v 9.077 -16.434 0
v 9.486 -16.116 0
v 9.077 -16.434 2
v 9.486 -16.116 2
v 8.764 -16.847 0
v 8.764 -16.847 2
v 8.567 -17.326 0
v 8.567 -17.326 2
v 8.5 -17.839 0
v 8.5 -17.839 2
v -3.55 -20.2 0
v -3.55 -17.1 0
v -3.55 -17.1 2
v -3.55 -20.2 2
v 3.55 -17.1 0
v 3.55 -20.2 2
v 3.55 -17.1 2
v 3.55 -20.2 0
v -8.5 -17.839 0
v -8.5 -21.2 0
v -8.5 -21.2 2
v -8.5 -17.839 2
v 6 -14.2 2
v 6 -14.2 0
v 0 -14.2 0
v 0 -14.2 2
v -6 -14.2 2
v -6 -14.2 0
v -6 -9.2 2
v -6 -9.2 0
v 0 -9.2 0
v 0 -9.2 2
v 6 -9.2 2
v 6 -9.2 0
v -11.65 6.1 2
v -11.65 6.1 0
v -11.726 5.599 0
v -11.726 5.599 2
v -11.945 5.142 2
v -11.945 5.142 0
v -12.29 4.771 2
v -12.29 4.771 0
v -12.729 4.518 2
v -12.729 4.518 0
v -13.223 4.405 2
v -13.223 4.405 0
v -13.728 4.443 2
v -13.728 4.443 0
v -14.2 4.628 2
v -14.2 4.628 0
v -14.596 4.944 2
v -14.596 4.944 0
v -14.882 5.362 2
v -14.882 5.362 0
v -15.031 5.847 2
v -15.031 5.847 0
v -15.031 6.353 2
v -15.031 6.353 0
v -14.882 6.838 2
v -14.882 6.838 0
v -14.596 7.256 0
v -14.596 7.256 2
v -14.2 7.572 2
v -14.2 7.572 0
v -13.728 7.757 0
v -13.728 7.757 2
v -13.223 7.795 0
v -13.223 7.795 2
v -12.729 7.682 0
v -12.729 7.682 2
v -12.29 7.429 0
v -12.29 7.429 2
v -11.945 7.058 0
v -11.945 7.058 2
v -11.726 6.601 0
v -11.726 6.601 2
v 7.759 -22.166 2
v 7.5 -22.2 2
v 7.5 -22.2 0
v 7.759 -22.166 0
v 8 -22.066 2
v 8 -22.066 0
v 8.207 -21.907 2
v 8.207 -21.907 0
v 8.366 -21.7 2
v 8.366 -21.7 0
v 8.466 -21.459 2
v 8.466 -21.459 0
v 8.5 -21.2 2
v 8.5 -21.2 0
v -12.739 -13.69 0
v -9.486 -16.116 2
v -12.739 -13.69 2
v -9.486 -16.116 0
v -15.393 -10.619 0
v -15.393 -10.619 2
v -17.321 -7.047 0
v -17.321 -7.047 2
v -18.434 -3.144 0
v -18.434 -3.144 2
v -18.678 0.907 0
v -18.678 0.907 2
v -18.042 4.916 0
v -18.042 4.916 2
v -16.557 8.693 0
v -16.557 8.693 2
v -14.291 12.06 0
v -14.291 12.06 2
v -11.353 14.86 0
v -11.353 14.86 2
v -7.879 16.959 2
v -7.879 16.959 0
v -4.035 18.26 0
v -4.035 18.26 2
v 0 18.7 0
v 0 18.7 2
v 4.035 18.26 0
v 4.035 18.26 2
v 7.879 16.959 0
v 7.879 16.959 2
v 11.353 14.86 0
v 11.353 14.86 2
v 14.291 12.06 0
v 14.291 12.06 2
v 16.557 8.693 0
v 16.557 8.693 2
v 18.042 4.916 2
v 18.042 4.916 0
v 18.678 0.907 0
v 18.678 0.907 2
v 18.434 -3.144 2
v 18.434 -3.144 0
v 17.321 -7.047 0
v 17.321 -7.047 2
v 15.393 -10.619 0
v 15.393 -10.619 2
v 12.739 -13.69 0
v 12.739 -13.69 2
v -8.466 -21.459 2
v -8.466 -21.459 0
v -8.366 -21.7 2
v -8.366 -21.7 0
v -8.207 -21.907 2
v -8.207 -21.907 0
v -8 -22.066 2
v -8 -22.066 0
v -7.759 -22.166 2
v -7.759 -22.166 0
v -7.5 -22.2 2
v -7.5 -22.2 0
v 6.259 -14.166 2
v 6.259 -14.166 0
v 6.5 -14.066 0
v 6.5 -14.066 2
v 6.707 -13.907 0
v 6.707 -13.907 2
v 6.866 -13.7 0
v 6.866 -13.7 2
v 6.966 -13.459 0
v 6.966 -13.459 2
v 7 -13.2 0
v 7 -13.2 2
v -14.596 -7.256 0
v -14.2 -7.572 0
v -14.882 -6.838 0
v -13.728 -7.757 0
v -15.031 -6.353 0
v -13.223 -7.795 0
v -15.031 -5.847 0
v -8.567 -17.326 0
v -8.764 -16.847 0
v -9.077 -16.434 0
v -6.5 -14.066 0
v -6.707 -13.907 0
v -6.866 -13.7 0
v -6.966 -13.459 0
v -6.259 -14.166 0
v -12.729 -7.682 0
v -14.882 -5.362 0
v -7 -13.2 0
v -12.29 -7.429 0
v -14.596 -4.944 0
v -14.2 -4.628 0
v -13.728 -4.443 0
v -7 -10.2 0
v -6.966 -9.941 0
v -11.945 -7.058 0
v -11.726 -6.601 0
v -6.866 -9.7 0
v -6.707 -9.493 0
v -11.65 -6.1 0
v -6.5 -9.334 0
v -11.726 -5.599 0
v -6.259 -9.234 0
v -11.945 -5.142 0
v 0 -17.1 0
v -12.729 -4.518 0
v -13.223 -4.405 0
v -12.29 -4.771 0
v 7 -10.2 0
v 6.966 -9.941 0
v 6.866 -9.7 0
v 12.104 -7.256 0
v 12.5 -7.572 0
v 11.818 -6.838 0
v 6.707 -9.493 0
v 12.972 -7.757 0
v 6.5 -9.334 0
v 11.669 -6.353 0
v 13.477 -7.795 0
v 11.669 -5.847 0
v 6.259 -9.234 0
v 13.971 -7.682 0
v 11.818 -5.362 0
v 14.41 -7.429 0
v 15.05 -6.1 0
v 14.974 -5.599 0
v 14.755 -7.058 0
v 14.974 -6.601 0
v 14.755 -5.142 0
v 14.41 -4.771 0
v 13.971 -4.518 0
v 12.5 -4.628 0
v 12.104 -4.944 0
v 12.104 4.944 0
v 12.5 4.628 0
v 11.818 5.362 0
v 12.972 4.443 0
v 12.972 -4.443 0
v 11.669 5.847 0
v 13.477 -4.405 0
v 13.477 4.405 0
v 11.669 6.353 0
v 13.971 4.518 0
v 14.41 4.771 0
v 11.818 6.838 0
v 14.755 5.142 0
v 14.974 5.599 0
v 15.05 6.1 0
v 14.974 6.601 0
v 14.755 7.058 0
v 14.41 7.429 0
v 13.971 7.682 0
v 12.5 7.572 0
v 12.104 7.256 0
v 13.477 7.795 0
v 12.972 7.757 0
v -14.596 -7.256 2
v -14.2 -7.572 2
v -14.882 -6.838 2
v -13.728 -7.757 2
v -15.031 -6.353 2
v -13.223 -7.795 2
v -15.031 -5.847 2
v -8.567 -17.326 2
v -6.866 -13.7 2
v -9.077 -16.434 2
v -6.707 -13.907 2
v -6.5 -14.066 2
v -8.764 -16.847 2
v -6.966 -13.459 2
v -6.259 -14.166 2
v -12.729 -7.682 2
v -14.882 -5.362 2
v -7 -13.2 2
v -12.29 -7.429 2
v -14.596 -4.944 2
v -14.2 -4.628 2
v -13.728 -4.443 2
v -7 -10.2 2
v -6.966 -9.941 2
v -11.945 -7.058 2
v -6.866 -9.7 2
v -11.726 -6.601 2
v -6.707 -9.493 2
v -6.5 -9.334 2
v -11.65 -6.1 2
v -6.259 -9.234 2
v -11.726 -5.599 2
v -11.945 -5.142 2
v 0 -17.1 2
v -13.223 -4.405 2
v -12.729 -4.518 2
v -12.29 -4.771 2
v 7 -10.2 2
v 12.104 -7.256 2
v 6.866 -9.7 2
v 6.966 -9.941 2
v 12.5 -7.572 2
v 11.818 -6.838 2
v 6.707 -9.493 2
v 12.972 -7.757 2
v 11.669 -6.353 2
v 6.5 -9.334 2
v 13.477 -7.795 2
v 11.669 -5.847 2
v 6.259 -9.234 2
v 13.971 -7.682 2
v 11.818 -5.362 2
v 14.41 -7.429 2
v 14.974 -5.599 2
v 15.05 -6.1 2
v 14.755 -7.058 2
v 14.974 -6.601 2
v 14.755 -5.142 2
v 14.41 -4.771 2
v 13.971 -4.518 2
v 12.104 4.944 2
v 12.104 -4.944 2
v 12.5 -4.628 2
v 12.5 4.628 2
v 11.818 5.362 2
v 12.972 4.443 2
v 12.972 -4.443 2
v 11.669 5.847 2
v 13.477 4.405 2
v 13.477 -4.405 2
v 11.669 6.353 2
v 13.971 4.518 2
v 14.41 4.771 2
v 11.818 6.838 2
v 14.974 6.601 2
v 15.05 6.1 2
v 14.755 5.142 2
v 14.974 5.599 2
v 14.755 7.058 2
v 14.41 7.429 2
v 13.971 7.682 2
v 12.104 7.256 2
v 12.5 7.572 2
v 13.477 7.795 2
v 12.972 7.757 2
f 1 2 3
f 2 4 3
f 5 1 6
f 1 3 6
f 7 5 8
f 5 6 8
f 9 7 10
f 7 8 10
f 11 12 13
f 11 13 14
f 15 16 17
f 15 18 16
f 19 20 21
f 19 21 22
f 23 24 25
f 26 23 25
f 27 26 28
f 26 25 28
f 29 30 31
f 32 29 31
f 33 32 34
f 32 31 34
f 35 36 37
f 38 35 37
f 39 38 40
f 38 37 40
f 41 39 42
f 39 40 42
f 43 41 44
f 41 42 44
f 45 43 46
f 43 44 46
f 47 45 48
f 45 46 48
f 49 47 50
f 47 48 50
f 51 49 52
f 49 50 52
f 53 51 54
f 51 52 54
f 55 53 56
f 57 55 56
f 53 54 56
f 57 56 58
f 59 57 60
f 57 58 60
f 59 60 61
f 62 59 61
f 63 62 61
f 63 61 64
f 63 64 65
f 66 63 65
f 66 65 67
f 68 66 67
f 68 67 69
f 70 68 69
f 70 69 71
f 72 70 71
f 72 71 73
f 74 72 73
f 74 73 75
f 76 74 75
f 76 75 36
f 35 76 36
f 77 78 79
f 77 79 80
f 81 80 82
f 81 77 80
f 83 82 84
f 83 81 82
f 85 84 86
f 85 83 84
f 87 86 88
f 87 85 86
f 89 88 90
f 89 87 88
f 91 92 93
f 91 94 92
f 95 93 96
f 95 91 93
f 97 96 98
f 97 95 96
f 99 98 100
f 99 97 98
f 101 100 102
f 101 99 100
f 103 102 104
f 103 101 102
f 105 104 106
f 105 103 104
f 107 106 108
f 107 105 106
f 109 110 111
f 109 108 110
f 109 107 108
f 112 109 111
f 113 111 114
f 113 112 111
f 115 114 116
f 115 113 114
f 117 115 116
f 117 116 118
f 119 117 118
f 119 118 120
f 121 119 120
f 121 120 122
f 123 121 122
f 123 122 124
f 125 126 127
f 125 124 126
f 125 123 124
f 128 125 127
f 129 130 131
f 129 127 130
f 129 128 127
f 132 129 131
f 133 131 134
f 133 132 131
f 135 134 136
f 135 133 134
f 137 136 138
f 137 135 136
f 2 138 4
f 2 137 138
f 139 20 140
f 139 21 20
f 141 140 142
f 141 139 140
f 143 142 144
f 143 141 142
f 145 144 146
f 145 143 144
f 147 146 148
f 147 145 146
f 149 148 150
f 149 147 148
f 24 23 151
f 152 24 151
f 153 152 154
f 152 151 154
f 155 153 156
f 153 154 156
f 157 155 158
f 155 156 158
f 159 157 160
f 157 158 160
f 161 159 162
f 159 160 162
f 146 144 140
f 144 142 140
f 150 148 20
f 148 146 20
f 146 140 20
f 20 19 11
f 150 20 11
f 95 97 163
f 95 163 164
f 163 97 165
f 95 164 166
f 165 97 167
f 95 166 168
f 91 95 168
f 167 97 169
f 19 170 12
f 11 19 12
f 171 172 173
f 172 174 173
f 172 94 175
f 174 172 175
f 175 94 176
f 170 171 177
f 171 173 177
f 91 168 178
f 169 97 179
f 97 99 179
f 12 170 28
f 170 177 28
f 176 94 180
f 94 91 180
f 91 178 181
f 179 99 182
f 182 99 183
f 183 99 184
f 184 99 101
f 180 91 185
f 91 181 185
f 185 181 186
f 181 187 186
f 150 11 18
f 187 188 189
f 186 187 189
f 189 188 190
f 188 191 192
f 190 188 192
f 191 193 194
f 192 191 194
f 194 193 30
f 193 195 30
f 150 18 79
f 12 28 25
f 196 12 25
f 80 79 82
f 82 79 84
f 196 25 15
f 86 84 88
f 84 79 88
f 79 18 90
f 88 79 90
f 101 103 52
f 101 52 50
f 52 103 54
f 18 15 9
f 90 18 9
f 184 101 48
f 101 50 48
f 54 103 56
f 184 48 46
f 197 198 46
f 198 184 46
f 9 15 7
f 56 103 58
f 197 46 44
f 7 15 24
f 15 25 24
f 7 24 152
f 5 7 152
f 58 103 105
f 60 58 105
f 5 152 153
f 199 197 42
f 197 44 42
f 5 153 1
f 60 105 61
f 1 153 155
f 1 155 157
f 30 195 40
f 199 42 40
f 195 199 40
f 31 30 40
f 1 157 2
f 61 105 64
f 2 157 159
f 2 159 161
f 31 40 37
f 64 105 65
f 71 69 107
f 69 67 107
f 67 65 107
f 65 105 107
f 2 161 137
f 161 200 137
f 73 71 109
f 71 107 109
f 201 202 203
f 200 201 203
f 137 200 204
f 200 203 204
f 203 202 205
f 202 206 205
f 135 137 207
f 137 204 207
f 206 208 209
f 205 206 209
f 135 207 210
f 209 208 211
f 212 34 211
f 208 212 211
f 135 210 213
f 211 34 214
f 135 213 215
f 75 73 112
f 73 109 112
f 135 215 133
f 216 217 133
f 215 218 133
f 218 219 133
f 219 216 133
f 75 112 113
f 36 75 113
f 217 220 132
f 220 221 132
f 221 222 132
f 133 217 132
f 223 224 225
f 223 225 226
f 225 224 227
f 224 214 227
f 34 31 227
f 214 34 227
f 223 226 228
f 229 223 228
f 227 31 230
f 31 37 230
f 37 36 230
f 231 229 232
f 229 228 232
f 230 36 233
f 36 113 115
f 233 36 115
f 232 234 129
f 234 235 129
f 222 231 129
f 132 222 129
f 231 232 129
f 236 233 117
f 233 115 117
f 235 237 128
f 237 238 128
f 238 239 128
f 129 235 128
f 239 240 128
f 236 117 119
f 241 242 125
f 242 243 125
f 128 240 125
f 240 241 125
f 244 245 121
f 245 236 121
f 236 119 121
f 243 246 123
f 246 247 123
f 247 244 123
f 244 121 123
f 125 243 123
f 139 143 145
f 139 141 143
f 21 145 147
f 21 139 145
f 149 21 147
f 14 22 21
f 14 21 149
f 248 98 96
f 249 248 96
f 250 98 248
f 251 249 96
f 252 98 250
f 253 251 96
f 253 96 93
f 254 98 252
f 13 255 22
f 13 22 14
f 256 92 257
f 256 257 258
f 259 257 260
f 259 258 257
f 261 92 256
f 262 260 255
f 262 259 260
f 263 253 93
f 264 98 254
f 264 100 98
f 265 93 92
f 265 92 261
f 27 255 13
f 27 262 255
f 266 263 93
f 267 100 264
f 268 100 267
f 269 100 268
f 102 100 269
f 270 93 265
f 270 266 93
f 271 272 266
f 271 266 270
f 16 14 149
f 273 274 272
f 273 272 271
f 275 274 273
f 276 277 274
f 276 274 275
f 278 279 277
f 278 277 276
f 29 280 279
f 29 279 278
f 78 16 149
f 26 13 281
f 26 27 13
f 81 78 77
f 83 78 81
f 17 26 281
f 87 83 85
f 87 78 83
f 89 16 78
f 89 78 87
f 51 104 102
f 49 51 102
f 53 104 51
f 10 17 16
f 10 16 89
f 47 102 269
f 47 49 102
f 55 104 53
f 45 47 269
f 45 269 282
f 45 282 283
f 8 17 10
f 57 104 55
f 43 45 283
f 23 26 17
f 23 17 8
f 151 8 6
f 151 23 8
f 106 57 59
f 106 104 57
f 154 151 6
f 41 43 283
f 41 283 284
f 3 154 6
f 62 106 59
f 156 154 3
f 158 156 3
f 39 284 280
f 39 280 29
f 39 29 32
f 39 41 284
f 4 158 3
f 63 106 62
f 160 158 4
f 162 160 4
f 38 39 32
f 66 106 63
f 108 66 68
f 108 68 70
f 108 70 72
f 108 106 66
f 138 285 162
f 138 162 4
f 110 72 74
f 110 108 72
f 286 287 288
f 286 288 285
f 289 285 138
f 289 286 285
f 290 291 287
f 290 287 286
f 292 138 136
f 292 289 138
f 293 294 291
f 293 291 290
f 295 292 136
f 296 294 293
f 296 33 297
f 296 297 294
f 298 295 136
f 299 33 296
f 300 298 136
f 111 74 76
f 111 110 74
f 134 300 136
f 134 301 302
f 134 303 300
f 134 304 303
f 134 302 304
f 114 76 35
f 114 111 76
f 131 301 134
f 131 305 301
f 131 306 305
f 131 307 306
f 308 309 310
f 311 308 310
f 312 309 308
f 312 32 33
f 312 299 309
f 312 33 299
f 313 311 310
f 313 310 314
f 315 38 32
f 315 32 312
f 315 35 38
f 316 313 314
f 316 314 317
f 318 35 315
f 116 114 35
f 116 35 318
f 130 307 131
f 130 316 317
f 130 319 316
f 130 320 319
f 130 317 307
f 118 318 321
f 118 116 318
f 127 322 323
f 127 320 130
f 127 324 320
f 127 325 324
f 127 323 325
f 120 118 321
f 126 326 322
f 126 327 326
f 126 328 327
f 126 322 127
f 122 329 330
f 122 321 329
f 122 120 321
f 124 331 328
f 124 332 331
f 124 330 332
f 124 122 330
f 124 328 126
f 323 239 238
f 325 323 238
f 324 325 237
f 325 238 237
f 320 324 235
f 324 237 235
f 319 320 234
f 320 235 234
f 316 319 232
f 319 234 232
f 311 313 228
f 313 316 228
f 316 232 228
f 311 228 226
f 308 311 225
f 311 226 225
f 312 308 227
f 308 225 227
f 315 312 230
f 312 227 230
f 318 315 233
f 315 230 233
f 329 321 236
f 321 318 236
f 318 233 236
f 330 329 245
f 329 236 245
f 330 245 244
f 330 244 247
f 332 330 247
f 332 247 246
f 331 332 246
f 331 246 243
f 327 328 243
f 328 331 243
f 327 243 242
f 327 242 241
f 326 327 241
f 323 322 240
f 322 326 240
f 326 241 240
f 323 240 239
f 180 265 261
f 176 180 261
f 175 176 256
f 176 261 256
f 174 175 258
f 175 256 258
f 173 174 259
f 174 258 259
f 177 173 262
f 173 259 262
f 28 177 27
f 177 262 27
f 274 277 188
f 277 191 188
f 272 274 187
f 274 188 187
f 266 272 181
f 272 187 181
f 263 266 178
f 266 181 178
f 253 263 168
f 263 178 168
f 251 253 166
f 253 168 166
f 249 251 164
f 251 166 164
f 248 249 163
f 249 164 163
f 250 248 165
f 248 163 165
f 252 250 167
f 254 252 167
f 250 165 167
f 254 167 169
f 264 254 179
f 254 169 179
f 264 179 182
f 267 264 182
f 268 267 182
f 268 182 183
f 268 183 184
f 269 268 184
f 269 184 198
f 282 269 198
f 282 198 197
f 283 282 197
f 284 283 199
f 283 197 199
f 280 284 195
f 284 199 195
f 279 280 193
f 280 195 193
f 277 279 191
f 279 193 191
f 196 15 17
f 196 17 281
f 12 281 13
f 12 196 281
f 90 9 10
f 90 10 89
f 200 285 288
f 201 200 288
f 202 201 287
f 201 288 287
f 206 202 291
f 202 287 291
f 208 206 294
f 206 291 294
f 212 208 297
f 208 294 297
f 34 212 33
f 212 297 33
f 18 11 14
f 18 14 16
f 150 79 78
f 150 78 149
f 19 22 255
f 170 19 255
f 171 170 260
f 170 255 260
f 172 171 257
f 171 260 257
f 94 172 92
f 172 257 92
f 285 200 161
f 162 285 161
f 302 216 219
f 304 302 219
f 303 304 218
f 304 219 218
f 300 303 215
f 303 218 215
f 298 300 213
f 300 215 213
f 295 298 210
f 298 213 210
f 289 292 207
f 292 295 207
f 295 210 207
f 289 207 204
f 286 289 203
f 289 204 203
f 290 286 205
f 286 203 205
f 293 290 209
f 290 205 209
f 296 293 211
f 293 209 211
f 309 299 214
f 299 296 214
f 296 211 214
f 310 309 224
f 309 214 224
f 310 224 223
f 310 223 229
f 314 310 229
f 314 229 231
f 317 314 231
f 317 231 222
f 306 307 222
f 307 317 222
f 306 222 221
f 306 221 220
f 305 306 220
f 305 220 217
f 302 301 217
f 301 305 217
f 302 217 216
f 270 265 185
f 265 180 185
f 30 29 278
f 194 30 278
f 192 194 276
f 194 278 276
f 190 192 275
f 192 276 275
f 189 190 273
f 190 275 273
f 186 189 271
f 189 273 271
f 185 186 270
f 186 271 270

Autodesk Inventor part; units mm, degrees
ref_plane "YZ Plane" through (0, 0, 0) normal (1, 0, 0) x (0, 1, 0)
ref_plane "XZ Plane" through (0, 0, 0) normal (0, 1, 0) x (-1, 0, 0)
ref_plane "XY Plane" through (0, 0, 0) normal (0, 0, 1) x (1, 0, 0)
sketch "Náčrt1" plane through (0, 0, 0) normal (0, 0, 1) x (1, 0, 0)
  arc A0 (8.5, -16.6565) -> (-8.5, -16.6565) centre (0, 0) ccw
  line L0 (8.5, -16.6565) -> (8.5, -22.2)
  line L1 (8.5, -22.2) -> (-8.5, -22.2)
  line L2 (-8.5, -22.2) -> (-8.5, -16.6565)
  line L3 (0, -18.7455) -> (8.5, -22.2) construction
  line L4 (0, -18.7455) -> (-8.5, -22.2) construction
  line L5 (0, 18.7) -> (0, -18.7455)
  line L6 (-13.35, 6.1) -> (13.35, 6.1)
  line L7 (13.35, 6.1) -> (13.35, -6.1)
  line L8 (13.35, -6.1) -> (-13.35, -6.1)
  line L9 (-13.35, -6.1) -> (-13.35, 6.1)
  line L10 (-13.35, 6.1) -> (13.35, -6.1) construction
  line L11 (13.35, 6.1) -> (-13.35, -6.1) construction
  circle A1 centre (-13.35, 6.1) radius 2.75
  circle A2 centre (-13.35, 6.1) radius 1.7
  circle A3 centre (-13.35, -6.1) radius 2.75
  circle A4 centre (-13.35, -6.1) radius 1.7
  circle A5 centre (13.35, -6.1) radius 2.75
  circle A6 centre (13.35, -6.1) radius 1.7
  circle A7 centre (13.35, 6.1) radius 2.75
  circle A8 centre (13.35, 6.1) radius 1.7
  line L12 (-7, -9.2) -> (7, -9.2)
  line L13 (7, -9.2) -> (7, -14.2)
  line L14 (7, -14.2) -> (-7, -14.2)
  line L15 (-7, -14.2) -> (-7, -9.2)
  line L16 (-7, -9.2) -> (7, -14.2) construction
  line L17 (7, -9.2) -> (-7, -14.2) construction
  line L18 (-3.55, -20.2) -> (3.55, -20.2)
  line L19 (3.55, -20.2) -> (3.55, -17.1)
  line L20 (3.55, -17.1) -> (-3.55, -17.1)
  line L21 (-3.55, -17.1) -> (-3.55, -20.2)
  line L22 (-3.55, -20.2) -> (3.55, -17.1) construction
  line L23 (3.55, -20.2) -> (-3.55, -17.1) construction
  point P0 (0, -11.7)
  point P1 (0, -18.65)
  point P2 (7, -6.1)
  point P3 (-7, -6.1)
  dimension "d0" = 37.4
  dimension "d1" = 17
  dimension "d2" = 22.2
  dimension "d3" = 26.7
  dimension "d4" = 12.2
  dimension "d5" = 5.5
  dimension "d6" = 3.4
  dimension "d7" = 5.5
  dimension "d8" = 3.4
  dimension "d9" = 5.5
  dimension "d10" = 3.4
  dimension "d11" = 5.5
  dimension "d12" = 3.4
  dimension "d15" = 14
  dimension "d16" = 5
  dimension "d21" = 7.1
  dimension "d22" = 3.1
  dimension "d23" = 2
  dimension "d24" = 8
extrude "Vysunutí1" add sketch "Náčrt1" along normal blind 2 contours L6 A7 L7 A5 L8 L5 | L5 L8 A3 L9 A1 L6 | L0 L1 L2 A0 | A1 L9 A2 L6 | L6 A2 L9 A1 | A7 L7 A8 L6 | L6 A8 L7 A7 | A5 L7 A6 L8 | L8 A6 L7 A5 | A3 L9 A4 L8 | L8 A4 L9 A3
fillet "Zaoblení1" radius 2 2 edges at (-8.5, -16.6565, 1) (8.5, -16.6565, 1)
fillet "Zaoblení2" radius 1 2 edges at (8.5, -22.2, 1) (-8.5, -22.2, 1)
fillet "Zaoblení3" radius 1 4 edges at (-7, -9.2, 1) (7, -9.2, 1) (-7, -14.2, 1) (7, -14.2, 1)
properties part number "Držák-Disp"
